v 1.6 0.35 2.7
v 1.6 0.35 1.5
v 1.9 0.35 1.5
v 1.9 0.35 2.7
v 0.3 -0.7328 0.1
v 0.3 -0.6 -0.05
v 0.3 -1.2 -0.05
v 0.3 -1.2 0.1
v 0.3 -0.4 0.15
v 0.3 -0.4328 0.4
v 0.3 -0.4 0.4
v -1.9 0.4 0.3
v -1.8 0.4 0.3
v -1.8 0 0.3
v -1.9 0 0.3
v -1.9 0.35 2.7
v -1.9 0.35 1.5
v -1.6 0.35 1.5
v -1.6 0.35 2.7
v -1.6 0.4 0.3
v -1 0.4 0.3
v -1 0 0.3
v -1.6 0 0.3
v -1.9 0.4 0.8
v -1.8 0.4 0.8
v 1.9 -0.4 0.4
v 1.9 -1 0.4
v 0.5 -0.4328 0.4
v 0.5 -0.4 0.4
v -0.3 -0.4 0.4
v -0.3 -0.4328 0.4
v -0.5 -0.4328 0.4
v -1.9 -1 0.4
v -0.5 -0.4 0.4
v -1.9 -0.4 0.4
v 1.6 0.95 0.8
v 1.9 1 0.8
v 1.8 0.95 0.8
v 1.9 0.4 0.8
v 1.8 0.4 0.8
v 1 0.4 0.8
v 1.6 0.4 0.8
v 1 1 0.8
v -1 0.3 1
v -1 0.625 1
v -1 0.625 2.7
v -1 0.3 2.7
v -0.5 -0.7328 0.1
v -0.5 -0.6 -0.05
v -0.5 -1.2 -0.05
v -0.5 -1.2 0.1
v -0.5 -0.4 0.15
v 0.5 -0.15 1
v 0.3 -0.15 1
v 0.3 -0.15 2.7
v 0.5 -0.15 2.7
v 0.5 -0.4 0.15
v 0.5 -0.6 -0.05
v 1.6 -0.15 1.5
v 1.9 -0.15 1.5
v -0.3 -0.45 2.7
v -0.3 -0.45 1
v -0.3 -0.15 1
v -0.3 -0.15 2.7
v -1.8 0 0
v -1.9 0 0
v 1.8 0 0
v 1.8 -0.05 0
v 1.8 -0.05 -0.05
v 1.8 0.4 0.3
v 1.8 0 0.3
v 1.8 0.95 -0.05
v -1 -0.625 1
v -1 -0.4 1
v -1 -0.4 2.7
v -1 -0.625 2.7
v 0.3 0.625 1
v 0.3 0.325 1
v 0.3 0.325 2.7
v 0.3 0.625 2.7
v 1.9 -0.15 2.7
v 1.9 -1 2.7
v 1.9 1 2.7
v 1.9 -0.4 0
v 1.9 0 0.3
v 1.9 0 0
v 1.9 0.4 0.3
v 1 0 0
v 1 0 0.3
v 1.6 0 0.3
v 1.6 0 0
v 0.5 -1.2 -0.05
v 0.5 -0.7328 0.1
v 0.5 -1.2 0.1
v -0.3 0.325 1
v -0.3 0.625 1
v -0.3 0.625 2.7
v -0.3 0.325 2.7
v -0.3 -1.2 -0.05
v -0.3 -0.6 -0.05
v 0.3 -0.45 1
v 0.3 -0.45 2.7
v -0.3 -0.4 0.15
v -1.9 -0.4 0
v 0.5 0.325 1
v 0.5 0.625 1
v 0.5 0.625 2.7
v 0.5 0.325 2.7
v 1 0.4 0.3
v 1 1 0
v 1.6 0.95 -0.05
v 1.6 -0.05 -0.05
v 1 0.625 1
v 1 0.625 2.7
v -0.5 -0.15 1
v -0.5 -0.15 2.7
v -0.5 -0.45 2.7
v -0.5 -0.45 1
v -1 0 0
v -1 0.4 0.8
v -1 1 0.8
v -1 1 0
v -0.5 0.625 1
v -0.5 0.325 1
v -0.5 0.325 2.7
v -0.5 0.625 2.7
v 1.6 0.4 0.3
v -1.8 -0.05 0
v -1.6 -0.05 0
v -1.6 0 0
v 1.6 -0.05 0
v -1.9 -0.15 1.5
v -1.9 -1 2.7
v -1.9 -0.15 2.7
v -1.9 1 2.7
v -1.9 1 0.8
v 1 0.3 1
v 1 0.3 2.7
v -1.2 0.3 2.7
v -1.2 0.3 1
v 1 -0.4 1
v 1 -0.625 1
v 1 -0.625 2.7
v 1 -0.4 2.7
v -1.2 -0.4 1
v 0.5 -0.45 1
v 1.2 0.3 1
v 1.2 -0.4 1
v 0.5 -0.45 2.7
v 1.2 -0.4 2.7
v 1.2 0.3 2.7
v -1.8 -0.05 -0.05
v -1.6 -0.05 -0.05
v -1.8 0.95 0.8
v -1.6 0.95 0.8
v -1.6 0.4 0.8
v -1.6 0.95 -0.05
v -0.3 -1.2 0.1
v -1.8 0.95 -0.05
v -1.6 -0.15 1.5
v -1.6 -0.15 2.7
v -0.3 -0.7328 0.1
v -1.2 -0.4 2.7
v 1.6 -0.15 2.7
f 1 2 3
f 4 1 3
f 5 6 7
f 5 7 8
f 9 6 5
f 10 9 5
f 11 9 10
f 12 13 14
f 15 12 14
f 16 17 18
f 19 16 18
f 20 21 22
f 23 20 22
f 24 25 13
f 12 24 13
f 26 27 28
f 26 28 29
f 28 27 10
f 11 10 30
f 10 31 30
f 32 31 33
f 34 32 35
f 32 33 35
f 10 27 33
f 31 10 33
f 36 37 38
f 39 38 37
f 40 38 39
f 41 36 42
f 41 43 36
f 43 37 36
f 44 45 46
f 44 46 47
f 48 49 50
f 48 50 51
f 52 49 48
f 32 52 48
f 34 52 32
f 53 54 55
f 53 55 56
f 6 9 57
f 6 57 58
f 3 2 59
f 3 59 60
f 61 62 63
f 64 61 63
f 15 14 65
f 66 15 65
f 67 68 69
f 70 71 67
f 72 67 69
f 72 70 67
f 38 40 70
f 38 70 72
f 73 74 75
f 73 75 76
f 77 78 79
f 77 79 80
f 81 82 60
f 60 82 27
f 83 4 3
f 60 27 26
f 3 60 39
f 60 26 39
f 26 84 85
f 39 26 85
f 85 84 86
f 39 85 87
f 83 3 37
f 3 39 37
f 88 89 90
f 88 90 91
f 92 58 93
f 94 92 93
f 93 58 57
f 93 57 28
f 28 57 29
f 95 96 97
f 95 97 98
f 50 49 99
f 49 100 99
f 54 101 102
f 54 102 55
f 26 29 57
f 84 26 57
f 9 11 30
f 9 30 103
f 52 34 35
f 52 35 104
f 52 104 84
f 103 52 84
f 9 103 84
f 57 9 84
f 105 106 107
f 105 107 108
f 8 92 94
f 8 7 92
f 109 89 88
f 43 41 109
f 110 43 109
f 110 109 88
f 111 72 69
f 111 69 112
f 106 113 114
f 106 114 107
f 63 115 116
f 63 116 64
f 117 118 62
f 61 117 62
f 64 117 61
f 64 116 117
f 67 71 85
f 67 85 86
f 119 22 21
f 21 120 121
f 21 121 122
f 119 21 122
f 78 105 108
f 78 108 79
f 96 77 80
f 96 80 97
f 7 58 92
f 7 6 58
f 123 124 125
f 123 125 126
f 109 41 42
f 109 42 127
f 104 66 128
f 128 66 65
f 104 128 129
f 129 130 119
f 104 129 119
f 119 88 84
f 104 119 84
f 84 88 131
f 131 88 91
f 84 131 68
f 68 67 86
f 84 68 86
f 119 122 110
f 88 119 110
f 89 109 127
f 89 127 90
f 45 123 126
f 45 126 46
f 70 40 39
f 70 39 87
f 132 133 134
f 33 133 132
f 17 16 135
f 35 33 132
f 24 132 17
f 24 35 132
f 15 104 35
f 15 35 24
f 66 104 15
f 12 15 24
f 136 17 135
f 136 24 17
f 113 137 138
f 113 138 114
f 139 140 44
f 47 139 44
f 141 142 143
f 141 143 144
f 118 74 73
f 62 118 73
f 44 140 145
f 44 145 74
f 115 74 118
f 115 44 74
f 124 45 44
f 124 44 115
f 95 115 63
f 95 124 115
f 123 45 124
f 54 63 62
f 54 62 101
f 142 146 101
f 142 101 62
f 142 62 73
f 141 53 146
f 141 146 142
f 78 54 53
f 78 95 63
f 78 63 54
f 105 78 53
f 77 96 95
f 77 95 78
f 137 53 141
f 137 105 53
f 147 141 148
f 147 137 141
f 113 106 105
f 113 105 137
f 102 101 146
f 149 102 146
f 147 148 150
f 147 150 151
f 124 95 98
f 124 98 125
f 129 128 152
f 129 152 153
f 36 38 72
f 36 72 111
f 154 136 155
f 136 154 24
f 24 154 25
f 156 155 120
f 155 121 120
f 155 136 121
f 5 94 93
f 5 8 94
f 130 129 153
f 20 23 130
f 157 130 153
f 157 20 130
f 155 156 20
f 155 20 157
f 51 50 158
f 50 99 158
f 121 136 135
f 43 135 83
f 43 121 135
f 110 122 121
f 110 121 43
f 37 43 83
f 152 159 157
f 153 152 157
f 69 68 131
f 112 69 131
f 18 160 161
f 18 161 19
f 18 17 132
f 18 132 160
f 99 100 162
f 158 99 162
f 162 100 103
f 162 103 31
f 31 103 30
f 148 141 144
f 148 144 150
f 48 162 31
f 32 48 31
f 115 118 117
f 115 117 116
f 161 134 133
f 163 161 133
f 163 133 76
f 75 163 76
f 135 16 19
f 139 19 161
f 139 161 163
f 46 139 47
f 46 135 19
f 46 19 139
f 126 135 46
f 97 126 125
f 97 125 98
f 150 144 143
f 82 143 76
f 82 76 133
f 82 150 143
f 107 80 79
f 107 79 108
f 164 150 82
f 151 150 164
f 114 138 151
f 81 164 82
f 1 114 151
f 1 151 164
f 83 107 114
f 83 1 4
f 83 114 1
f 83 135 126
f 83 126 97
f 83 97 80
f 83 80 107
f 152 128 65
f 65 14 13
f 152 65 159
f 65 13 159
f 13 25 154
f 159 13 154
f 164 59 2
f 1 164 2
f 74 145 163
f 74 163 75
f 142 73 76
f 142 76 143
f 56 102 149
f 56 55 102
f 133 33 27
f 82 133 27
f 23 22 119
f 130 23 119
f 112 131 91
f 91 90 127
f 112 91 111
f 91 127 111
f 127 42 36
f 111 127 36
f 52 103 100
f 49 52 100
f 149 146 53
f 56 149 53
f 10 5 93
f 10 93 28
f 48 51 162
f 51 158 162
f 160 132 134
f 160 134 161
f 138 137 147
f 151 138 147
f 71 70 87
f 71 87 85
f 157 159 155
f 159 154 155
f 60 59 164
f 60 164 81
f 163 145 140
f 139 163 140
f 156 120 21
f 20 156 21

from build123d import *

# Parameters (mm, degrees)
SKIZZE1_W                                   = 3.8
SKIZZE1_H                                   = 2
AUFSATZ_LINEAR_AUSTRAGEN1_DEPTH             = 2.7
SCHNITT_LINEAR_AUSTRAGEN1_DEPTH             = 4.449637662
SCHNITT_LINEAR_AUSTRAGEN1_DEPTH_BACK        = 4.449637662
SKIZZE2_W                                   = 0.4
SKIZZE2_H                                   = 0.6
SCHNITT_LINEAR_START                        = -1
SCHNITT_LINEAR_AUSTRAGEN4_DEPTH             = 3.449637662
AUFSATZ_LINEAR_START                        = -0.4
AUFSATZ_LINEAR_AUSTRAGEN2_DEPTH             = 0.1
AUFSATZ_LINEAR_AUSTRAGEN3_REACH             = 5.513
SKIZZE5_W                                   = 0.2
SKIZZE5_H                                   = 1
AUFSATZ_LINEAR_AUSTRAGEN3_DIRECTION_2_DEPTH = 0.05
SCHNITT_LINEAR_START_2                      = 1
SKIZZE6_W                                   = 0.2
SKIZZE6_H                                   = 0.3
SCHNITT_LINEAR_AUSTRAGEN5_DEPTH             = 3.512833614
SKIZZE7_W                                   = 0.2
SKIZZE7_H                                   = 0.7
SCHNITT_LINEAR_AUSTRAGEN6_DEPTH             = 3.512833614
SCHNITT_LINEAR_START_3                      = 1.5
SKIZZE8_W                                   = 0.3
SKIZZE8_H                                   = 0.5
SCHNITT_LINEAR_AUSTRAGEN7_DEPTH             = 3.012833614


with BuildPart() as part:
    # Skizze1 → Aufsatz-Linear austragen1 (new body)
    with BuildSketch(Plane.XY):
        Rectangle(SKIZZE1_W, SKIZZE1_H)
    extrude(amount=AUFSATZ_LINEAR_AUSTRAGEN1_DEPTH)

    # Skizze2 → Schnitt-Linear austragen1 (cut, two sides: drawn at the far end of the back side and taken through both)
    with BuildSketch(Plane(origin=(0, 0, 0), x_dir=(0, 0, -1), z_dir=(1, 0, 0)).offset(-SCHNITT_LINEAR_AUSTRAGEN1_DEPTH_BACK)):
        with Locations((-0.2, -0.7)):
            Rectangle(SKIZZE2_W, SKIZZE2_H)
    extrude(amount=SCHNITT_LINEAR_AUSTRAGEN1_DEPTH + SCHNITT_LINEAR_AUSTRAGEN1_DEPTH_BACK, mode=Mode.SUBTRACT)

    # Skizze3 → Schnitt-Linear austragen4 (cut, through all)
    with BuildSketch(Plane(origin=(0, 0, 0), x_dir=(0, 0, -1), z_dir=(1, 0, 0)).offset(SCHNITT_LINEAR_START)):
        Polygon((-0.8, 1), (-0.8, 0.4), (-0.3, 0.4), (-0.3, 0), (0, 0), (0, 1), align=None)
    schnitt_linear_austragen4 = extrude(amount=-SCHNITT_LINEAR_AUSTRAGEN4_DEPTH, mode=Mode.SUBTRACT)

    # Skizze4 → Aufsatz-Linear austragen2 (add, symmetric)
    with BuildSketch(Plane(origin=(0, 0, 0), x_dir=(0, 0, -1), z_dir=(1, 0, 0)).offset(AUFSATZ_LINEAR_START)):
        Polygon((-0.15, -0.4), (0.05, -0.6), (0.05, -1.2), (-0.1, -1.2), (-0.1, -0.732842712), (-0.432842712, -0.4), align=None)
    aufsatz_linear_austragen2 = extrude(amount=AUFSATZ_LINEAR_AUSTRAGEN2_DEPTH, both=True)

    # Skizze5 → Aufsatz-Linear austragen3 (add, up to next)
    with BuildSketch(Plane.XY, mode=Mode.PRIVATE) as aufsatz_linear_austragen3_sk1:
        with Locations((-1.7, 0.45)):
            Rectangle(SKIZZE5_W, SKIZZE5_H)
    aufsatz_linear_austragen3_tool1 = extrude(aufsatz_linear_austragen3_sk1.sketch, amount=AUFSATZ_LINEAR_AUSTRAGEN3_REACH, mode=Mode.PRIVATE) - part.part
    aufsatz_linear_austragen3 = aufsatz_linear_austragen3_tool1.solids().sort_by_distance((-1.7, 0.45, 0))[0]
    add(aufsatz_linear_austragen3)

    # Skizze5 → Aufsatz-Linear austragen3 direction 2 (add)
    with BuildSketch(Plane.XY):
        with Locations((-1.7, 0.45)):
            Rectangle(SKIZZE5_W, SKIZZE5_H)
    aufsatz_linear_austragen3_direction_2 = extrude(amount=-AUFSATZ_LINEAR_AUSTRAGEN3_DIRECTION_2_DEPTH)

    # Skizze6 → Schnitt-Linear austragen5 (cut, through all)
    with BuildSketch(Plane.XY.offset(SCHNITT_LINEAR_START_2)):
        Polygon((-1, 0.625), (-1, -0.625), (1, -0.625), (1, 0.625), (0.5, 0.625), (0.5, 0.325), (0.3, 0.325), (0.3, 0.625), (-0.3, 0.625), (-0.3, 0.325), (-0.5, 0.325), (-0.5, 0.625), align=None)
        with Locations((-0.4, -0.3)):
            Rectangle(SKIZZE6_W, SKIZZE6_H, mode=Mode.SUBTRACT)
        with Locations((0.4, -0.3)):
            Rectangle(SKIZZE6_W, SKIZZE6_H, mode=Mode.SUBTRACT)
    extrude(amount=SCHNITT_LINEAR_AUSTRAGEN5_DEPTH, mode=Mode.SUBTRACT)

    # Skizze7 → Schnitt-Linear austragen6 (cut, through all)
    with BuildSketch(Plane.XY.offset(SCHNITT_LINEAR_START_2)):
        with Locations((-1.1, -0.05)):
            Rectangle(SKIZZE7_W, SKIZZE7_H)
        with Locations((1.1, -0.05)):
            Rectangle(SKIZZE7_W, SKIZZE7_H)
    extrude(amount=SCHNITT_LINEAR_AUSTRAGEN6_DEPTH, mode=Mode.SUBTRACT)

    # Skizze8 → Schnitt-Linear austragen7 (cut, through all)
    with BuildSketch(Plane.XY.offset(SCHNITT_LINEAR_START_3)):
        with Locations((-1.75, 0.1)):
            Rectangle(SKIZZE8_W, SKIZZE8_H)
        with Locations((1.75, 0.1)):
            Rectangle(SKIZZE8_W, SKIZZE8_H)
    extrude(amount=SCHNITT_LINEAR_AUSTRAGEN7_DEPTH, mode=Mode.SUBTRACT)

    # Spiegeln1: Schnitt-Linear austragen4, Aufsatz-Linear austragen2, Aufsatz-Linear austragen3, Aufsatz-Linear austragen3 direction 2 across plane
    add(schnitt_linear_austragen4.mirror(Plane(origin=(0, 0, 0), x_dir=(0, 0, 1), z_dir=(1, 0, 0))), mode=Mode.SUBTRACT)
    add(aufsatz_linear_austragen2.mirror(Plane(origin=(0, 0, 0), x_dir=(0, 0, 1), z_dir=(1, 0, 0))))
    add(aufsatz_linear_austragen3.mirror(Plane(origin=(0, 0, 0), x_dir=(0, 0, 1), z_dir=(1, 0, 0))))
    add(aufsatz_linear_austragen3_direction_2.mirror(Plane(origin=(0, 0, 0), x_dir=(0, 0, 1), z_dir=(1, 0, 0))))


solid = part.part
